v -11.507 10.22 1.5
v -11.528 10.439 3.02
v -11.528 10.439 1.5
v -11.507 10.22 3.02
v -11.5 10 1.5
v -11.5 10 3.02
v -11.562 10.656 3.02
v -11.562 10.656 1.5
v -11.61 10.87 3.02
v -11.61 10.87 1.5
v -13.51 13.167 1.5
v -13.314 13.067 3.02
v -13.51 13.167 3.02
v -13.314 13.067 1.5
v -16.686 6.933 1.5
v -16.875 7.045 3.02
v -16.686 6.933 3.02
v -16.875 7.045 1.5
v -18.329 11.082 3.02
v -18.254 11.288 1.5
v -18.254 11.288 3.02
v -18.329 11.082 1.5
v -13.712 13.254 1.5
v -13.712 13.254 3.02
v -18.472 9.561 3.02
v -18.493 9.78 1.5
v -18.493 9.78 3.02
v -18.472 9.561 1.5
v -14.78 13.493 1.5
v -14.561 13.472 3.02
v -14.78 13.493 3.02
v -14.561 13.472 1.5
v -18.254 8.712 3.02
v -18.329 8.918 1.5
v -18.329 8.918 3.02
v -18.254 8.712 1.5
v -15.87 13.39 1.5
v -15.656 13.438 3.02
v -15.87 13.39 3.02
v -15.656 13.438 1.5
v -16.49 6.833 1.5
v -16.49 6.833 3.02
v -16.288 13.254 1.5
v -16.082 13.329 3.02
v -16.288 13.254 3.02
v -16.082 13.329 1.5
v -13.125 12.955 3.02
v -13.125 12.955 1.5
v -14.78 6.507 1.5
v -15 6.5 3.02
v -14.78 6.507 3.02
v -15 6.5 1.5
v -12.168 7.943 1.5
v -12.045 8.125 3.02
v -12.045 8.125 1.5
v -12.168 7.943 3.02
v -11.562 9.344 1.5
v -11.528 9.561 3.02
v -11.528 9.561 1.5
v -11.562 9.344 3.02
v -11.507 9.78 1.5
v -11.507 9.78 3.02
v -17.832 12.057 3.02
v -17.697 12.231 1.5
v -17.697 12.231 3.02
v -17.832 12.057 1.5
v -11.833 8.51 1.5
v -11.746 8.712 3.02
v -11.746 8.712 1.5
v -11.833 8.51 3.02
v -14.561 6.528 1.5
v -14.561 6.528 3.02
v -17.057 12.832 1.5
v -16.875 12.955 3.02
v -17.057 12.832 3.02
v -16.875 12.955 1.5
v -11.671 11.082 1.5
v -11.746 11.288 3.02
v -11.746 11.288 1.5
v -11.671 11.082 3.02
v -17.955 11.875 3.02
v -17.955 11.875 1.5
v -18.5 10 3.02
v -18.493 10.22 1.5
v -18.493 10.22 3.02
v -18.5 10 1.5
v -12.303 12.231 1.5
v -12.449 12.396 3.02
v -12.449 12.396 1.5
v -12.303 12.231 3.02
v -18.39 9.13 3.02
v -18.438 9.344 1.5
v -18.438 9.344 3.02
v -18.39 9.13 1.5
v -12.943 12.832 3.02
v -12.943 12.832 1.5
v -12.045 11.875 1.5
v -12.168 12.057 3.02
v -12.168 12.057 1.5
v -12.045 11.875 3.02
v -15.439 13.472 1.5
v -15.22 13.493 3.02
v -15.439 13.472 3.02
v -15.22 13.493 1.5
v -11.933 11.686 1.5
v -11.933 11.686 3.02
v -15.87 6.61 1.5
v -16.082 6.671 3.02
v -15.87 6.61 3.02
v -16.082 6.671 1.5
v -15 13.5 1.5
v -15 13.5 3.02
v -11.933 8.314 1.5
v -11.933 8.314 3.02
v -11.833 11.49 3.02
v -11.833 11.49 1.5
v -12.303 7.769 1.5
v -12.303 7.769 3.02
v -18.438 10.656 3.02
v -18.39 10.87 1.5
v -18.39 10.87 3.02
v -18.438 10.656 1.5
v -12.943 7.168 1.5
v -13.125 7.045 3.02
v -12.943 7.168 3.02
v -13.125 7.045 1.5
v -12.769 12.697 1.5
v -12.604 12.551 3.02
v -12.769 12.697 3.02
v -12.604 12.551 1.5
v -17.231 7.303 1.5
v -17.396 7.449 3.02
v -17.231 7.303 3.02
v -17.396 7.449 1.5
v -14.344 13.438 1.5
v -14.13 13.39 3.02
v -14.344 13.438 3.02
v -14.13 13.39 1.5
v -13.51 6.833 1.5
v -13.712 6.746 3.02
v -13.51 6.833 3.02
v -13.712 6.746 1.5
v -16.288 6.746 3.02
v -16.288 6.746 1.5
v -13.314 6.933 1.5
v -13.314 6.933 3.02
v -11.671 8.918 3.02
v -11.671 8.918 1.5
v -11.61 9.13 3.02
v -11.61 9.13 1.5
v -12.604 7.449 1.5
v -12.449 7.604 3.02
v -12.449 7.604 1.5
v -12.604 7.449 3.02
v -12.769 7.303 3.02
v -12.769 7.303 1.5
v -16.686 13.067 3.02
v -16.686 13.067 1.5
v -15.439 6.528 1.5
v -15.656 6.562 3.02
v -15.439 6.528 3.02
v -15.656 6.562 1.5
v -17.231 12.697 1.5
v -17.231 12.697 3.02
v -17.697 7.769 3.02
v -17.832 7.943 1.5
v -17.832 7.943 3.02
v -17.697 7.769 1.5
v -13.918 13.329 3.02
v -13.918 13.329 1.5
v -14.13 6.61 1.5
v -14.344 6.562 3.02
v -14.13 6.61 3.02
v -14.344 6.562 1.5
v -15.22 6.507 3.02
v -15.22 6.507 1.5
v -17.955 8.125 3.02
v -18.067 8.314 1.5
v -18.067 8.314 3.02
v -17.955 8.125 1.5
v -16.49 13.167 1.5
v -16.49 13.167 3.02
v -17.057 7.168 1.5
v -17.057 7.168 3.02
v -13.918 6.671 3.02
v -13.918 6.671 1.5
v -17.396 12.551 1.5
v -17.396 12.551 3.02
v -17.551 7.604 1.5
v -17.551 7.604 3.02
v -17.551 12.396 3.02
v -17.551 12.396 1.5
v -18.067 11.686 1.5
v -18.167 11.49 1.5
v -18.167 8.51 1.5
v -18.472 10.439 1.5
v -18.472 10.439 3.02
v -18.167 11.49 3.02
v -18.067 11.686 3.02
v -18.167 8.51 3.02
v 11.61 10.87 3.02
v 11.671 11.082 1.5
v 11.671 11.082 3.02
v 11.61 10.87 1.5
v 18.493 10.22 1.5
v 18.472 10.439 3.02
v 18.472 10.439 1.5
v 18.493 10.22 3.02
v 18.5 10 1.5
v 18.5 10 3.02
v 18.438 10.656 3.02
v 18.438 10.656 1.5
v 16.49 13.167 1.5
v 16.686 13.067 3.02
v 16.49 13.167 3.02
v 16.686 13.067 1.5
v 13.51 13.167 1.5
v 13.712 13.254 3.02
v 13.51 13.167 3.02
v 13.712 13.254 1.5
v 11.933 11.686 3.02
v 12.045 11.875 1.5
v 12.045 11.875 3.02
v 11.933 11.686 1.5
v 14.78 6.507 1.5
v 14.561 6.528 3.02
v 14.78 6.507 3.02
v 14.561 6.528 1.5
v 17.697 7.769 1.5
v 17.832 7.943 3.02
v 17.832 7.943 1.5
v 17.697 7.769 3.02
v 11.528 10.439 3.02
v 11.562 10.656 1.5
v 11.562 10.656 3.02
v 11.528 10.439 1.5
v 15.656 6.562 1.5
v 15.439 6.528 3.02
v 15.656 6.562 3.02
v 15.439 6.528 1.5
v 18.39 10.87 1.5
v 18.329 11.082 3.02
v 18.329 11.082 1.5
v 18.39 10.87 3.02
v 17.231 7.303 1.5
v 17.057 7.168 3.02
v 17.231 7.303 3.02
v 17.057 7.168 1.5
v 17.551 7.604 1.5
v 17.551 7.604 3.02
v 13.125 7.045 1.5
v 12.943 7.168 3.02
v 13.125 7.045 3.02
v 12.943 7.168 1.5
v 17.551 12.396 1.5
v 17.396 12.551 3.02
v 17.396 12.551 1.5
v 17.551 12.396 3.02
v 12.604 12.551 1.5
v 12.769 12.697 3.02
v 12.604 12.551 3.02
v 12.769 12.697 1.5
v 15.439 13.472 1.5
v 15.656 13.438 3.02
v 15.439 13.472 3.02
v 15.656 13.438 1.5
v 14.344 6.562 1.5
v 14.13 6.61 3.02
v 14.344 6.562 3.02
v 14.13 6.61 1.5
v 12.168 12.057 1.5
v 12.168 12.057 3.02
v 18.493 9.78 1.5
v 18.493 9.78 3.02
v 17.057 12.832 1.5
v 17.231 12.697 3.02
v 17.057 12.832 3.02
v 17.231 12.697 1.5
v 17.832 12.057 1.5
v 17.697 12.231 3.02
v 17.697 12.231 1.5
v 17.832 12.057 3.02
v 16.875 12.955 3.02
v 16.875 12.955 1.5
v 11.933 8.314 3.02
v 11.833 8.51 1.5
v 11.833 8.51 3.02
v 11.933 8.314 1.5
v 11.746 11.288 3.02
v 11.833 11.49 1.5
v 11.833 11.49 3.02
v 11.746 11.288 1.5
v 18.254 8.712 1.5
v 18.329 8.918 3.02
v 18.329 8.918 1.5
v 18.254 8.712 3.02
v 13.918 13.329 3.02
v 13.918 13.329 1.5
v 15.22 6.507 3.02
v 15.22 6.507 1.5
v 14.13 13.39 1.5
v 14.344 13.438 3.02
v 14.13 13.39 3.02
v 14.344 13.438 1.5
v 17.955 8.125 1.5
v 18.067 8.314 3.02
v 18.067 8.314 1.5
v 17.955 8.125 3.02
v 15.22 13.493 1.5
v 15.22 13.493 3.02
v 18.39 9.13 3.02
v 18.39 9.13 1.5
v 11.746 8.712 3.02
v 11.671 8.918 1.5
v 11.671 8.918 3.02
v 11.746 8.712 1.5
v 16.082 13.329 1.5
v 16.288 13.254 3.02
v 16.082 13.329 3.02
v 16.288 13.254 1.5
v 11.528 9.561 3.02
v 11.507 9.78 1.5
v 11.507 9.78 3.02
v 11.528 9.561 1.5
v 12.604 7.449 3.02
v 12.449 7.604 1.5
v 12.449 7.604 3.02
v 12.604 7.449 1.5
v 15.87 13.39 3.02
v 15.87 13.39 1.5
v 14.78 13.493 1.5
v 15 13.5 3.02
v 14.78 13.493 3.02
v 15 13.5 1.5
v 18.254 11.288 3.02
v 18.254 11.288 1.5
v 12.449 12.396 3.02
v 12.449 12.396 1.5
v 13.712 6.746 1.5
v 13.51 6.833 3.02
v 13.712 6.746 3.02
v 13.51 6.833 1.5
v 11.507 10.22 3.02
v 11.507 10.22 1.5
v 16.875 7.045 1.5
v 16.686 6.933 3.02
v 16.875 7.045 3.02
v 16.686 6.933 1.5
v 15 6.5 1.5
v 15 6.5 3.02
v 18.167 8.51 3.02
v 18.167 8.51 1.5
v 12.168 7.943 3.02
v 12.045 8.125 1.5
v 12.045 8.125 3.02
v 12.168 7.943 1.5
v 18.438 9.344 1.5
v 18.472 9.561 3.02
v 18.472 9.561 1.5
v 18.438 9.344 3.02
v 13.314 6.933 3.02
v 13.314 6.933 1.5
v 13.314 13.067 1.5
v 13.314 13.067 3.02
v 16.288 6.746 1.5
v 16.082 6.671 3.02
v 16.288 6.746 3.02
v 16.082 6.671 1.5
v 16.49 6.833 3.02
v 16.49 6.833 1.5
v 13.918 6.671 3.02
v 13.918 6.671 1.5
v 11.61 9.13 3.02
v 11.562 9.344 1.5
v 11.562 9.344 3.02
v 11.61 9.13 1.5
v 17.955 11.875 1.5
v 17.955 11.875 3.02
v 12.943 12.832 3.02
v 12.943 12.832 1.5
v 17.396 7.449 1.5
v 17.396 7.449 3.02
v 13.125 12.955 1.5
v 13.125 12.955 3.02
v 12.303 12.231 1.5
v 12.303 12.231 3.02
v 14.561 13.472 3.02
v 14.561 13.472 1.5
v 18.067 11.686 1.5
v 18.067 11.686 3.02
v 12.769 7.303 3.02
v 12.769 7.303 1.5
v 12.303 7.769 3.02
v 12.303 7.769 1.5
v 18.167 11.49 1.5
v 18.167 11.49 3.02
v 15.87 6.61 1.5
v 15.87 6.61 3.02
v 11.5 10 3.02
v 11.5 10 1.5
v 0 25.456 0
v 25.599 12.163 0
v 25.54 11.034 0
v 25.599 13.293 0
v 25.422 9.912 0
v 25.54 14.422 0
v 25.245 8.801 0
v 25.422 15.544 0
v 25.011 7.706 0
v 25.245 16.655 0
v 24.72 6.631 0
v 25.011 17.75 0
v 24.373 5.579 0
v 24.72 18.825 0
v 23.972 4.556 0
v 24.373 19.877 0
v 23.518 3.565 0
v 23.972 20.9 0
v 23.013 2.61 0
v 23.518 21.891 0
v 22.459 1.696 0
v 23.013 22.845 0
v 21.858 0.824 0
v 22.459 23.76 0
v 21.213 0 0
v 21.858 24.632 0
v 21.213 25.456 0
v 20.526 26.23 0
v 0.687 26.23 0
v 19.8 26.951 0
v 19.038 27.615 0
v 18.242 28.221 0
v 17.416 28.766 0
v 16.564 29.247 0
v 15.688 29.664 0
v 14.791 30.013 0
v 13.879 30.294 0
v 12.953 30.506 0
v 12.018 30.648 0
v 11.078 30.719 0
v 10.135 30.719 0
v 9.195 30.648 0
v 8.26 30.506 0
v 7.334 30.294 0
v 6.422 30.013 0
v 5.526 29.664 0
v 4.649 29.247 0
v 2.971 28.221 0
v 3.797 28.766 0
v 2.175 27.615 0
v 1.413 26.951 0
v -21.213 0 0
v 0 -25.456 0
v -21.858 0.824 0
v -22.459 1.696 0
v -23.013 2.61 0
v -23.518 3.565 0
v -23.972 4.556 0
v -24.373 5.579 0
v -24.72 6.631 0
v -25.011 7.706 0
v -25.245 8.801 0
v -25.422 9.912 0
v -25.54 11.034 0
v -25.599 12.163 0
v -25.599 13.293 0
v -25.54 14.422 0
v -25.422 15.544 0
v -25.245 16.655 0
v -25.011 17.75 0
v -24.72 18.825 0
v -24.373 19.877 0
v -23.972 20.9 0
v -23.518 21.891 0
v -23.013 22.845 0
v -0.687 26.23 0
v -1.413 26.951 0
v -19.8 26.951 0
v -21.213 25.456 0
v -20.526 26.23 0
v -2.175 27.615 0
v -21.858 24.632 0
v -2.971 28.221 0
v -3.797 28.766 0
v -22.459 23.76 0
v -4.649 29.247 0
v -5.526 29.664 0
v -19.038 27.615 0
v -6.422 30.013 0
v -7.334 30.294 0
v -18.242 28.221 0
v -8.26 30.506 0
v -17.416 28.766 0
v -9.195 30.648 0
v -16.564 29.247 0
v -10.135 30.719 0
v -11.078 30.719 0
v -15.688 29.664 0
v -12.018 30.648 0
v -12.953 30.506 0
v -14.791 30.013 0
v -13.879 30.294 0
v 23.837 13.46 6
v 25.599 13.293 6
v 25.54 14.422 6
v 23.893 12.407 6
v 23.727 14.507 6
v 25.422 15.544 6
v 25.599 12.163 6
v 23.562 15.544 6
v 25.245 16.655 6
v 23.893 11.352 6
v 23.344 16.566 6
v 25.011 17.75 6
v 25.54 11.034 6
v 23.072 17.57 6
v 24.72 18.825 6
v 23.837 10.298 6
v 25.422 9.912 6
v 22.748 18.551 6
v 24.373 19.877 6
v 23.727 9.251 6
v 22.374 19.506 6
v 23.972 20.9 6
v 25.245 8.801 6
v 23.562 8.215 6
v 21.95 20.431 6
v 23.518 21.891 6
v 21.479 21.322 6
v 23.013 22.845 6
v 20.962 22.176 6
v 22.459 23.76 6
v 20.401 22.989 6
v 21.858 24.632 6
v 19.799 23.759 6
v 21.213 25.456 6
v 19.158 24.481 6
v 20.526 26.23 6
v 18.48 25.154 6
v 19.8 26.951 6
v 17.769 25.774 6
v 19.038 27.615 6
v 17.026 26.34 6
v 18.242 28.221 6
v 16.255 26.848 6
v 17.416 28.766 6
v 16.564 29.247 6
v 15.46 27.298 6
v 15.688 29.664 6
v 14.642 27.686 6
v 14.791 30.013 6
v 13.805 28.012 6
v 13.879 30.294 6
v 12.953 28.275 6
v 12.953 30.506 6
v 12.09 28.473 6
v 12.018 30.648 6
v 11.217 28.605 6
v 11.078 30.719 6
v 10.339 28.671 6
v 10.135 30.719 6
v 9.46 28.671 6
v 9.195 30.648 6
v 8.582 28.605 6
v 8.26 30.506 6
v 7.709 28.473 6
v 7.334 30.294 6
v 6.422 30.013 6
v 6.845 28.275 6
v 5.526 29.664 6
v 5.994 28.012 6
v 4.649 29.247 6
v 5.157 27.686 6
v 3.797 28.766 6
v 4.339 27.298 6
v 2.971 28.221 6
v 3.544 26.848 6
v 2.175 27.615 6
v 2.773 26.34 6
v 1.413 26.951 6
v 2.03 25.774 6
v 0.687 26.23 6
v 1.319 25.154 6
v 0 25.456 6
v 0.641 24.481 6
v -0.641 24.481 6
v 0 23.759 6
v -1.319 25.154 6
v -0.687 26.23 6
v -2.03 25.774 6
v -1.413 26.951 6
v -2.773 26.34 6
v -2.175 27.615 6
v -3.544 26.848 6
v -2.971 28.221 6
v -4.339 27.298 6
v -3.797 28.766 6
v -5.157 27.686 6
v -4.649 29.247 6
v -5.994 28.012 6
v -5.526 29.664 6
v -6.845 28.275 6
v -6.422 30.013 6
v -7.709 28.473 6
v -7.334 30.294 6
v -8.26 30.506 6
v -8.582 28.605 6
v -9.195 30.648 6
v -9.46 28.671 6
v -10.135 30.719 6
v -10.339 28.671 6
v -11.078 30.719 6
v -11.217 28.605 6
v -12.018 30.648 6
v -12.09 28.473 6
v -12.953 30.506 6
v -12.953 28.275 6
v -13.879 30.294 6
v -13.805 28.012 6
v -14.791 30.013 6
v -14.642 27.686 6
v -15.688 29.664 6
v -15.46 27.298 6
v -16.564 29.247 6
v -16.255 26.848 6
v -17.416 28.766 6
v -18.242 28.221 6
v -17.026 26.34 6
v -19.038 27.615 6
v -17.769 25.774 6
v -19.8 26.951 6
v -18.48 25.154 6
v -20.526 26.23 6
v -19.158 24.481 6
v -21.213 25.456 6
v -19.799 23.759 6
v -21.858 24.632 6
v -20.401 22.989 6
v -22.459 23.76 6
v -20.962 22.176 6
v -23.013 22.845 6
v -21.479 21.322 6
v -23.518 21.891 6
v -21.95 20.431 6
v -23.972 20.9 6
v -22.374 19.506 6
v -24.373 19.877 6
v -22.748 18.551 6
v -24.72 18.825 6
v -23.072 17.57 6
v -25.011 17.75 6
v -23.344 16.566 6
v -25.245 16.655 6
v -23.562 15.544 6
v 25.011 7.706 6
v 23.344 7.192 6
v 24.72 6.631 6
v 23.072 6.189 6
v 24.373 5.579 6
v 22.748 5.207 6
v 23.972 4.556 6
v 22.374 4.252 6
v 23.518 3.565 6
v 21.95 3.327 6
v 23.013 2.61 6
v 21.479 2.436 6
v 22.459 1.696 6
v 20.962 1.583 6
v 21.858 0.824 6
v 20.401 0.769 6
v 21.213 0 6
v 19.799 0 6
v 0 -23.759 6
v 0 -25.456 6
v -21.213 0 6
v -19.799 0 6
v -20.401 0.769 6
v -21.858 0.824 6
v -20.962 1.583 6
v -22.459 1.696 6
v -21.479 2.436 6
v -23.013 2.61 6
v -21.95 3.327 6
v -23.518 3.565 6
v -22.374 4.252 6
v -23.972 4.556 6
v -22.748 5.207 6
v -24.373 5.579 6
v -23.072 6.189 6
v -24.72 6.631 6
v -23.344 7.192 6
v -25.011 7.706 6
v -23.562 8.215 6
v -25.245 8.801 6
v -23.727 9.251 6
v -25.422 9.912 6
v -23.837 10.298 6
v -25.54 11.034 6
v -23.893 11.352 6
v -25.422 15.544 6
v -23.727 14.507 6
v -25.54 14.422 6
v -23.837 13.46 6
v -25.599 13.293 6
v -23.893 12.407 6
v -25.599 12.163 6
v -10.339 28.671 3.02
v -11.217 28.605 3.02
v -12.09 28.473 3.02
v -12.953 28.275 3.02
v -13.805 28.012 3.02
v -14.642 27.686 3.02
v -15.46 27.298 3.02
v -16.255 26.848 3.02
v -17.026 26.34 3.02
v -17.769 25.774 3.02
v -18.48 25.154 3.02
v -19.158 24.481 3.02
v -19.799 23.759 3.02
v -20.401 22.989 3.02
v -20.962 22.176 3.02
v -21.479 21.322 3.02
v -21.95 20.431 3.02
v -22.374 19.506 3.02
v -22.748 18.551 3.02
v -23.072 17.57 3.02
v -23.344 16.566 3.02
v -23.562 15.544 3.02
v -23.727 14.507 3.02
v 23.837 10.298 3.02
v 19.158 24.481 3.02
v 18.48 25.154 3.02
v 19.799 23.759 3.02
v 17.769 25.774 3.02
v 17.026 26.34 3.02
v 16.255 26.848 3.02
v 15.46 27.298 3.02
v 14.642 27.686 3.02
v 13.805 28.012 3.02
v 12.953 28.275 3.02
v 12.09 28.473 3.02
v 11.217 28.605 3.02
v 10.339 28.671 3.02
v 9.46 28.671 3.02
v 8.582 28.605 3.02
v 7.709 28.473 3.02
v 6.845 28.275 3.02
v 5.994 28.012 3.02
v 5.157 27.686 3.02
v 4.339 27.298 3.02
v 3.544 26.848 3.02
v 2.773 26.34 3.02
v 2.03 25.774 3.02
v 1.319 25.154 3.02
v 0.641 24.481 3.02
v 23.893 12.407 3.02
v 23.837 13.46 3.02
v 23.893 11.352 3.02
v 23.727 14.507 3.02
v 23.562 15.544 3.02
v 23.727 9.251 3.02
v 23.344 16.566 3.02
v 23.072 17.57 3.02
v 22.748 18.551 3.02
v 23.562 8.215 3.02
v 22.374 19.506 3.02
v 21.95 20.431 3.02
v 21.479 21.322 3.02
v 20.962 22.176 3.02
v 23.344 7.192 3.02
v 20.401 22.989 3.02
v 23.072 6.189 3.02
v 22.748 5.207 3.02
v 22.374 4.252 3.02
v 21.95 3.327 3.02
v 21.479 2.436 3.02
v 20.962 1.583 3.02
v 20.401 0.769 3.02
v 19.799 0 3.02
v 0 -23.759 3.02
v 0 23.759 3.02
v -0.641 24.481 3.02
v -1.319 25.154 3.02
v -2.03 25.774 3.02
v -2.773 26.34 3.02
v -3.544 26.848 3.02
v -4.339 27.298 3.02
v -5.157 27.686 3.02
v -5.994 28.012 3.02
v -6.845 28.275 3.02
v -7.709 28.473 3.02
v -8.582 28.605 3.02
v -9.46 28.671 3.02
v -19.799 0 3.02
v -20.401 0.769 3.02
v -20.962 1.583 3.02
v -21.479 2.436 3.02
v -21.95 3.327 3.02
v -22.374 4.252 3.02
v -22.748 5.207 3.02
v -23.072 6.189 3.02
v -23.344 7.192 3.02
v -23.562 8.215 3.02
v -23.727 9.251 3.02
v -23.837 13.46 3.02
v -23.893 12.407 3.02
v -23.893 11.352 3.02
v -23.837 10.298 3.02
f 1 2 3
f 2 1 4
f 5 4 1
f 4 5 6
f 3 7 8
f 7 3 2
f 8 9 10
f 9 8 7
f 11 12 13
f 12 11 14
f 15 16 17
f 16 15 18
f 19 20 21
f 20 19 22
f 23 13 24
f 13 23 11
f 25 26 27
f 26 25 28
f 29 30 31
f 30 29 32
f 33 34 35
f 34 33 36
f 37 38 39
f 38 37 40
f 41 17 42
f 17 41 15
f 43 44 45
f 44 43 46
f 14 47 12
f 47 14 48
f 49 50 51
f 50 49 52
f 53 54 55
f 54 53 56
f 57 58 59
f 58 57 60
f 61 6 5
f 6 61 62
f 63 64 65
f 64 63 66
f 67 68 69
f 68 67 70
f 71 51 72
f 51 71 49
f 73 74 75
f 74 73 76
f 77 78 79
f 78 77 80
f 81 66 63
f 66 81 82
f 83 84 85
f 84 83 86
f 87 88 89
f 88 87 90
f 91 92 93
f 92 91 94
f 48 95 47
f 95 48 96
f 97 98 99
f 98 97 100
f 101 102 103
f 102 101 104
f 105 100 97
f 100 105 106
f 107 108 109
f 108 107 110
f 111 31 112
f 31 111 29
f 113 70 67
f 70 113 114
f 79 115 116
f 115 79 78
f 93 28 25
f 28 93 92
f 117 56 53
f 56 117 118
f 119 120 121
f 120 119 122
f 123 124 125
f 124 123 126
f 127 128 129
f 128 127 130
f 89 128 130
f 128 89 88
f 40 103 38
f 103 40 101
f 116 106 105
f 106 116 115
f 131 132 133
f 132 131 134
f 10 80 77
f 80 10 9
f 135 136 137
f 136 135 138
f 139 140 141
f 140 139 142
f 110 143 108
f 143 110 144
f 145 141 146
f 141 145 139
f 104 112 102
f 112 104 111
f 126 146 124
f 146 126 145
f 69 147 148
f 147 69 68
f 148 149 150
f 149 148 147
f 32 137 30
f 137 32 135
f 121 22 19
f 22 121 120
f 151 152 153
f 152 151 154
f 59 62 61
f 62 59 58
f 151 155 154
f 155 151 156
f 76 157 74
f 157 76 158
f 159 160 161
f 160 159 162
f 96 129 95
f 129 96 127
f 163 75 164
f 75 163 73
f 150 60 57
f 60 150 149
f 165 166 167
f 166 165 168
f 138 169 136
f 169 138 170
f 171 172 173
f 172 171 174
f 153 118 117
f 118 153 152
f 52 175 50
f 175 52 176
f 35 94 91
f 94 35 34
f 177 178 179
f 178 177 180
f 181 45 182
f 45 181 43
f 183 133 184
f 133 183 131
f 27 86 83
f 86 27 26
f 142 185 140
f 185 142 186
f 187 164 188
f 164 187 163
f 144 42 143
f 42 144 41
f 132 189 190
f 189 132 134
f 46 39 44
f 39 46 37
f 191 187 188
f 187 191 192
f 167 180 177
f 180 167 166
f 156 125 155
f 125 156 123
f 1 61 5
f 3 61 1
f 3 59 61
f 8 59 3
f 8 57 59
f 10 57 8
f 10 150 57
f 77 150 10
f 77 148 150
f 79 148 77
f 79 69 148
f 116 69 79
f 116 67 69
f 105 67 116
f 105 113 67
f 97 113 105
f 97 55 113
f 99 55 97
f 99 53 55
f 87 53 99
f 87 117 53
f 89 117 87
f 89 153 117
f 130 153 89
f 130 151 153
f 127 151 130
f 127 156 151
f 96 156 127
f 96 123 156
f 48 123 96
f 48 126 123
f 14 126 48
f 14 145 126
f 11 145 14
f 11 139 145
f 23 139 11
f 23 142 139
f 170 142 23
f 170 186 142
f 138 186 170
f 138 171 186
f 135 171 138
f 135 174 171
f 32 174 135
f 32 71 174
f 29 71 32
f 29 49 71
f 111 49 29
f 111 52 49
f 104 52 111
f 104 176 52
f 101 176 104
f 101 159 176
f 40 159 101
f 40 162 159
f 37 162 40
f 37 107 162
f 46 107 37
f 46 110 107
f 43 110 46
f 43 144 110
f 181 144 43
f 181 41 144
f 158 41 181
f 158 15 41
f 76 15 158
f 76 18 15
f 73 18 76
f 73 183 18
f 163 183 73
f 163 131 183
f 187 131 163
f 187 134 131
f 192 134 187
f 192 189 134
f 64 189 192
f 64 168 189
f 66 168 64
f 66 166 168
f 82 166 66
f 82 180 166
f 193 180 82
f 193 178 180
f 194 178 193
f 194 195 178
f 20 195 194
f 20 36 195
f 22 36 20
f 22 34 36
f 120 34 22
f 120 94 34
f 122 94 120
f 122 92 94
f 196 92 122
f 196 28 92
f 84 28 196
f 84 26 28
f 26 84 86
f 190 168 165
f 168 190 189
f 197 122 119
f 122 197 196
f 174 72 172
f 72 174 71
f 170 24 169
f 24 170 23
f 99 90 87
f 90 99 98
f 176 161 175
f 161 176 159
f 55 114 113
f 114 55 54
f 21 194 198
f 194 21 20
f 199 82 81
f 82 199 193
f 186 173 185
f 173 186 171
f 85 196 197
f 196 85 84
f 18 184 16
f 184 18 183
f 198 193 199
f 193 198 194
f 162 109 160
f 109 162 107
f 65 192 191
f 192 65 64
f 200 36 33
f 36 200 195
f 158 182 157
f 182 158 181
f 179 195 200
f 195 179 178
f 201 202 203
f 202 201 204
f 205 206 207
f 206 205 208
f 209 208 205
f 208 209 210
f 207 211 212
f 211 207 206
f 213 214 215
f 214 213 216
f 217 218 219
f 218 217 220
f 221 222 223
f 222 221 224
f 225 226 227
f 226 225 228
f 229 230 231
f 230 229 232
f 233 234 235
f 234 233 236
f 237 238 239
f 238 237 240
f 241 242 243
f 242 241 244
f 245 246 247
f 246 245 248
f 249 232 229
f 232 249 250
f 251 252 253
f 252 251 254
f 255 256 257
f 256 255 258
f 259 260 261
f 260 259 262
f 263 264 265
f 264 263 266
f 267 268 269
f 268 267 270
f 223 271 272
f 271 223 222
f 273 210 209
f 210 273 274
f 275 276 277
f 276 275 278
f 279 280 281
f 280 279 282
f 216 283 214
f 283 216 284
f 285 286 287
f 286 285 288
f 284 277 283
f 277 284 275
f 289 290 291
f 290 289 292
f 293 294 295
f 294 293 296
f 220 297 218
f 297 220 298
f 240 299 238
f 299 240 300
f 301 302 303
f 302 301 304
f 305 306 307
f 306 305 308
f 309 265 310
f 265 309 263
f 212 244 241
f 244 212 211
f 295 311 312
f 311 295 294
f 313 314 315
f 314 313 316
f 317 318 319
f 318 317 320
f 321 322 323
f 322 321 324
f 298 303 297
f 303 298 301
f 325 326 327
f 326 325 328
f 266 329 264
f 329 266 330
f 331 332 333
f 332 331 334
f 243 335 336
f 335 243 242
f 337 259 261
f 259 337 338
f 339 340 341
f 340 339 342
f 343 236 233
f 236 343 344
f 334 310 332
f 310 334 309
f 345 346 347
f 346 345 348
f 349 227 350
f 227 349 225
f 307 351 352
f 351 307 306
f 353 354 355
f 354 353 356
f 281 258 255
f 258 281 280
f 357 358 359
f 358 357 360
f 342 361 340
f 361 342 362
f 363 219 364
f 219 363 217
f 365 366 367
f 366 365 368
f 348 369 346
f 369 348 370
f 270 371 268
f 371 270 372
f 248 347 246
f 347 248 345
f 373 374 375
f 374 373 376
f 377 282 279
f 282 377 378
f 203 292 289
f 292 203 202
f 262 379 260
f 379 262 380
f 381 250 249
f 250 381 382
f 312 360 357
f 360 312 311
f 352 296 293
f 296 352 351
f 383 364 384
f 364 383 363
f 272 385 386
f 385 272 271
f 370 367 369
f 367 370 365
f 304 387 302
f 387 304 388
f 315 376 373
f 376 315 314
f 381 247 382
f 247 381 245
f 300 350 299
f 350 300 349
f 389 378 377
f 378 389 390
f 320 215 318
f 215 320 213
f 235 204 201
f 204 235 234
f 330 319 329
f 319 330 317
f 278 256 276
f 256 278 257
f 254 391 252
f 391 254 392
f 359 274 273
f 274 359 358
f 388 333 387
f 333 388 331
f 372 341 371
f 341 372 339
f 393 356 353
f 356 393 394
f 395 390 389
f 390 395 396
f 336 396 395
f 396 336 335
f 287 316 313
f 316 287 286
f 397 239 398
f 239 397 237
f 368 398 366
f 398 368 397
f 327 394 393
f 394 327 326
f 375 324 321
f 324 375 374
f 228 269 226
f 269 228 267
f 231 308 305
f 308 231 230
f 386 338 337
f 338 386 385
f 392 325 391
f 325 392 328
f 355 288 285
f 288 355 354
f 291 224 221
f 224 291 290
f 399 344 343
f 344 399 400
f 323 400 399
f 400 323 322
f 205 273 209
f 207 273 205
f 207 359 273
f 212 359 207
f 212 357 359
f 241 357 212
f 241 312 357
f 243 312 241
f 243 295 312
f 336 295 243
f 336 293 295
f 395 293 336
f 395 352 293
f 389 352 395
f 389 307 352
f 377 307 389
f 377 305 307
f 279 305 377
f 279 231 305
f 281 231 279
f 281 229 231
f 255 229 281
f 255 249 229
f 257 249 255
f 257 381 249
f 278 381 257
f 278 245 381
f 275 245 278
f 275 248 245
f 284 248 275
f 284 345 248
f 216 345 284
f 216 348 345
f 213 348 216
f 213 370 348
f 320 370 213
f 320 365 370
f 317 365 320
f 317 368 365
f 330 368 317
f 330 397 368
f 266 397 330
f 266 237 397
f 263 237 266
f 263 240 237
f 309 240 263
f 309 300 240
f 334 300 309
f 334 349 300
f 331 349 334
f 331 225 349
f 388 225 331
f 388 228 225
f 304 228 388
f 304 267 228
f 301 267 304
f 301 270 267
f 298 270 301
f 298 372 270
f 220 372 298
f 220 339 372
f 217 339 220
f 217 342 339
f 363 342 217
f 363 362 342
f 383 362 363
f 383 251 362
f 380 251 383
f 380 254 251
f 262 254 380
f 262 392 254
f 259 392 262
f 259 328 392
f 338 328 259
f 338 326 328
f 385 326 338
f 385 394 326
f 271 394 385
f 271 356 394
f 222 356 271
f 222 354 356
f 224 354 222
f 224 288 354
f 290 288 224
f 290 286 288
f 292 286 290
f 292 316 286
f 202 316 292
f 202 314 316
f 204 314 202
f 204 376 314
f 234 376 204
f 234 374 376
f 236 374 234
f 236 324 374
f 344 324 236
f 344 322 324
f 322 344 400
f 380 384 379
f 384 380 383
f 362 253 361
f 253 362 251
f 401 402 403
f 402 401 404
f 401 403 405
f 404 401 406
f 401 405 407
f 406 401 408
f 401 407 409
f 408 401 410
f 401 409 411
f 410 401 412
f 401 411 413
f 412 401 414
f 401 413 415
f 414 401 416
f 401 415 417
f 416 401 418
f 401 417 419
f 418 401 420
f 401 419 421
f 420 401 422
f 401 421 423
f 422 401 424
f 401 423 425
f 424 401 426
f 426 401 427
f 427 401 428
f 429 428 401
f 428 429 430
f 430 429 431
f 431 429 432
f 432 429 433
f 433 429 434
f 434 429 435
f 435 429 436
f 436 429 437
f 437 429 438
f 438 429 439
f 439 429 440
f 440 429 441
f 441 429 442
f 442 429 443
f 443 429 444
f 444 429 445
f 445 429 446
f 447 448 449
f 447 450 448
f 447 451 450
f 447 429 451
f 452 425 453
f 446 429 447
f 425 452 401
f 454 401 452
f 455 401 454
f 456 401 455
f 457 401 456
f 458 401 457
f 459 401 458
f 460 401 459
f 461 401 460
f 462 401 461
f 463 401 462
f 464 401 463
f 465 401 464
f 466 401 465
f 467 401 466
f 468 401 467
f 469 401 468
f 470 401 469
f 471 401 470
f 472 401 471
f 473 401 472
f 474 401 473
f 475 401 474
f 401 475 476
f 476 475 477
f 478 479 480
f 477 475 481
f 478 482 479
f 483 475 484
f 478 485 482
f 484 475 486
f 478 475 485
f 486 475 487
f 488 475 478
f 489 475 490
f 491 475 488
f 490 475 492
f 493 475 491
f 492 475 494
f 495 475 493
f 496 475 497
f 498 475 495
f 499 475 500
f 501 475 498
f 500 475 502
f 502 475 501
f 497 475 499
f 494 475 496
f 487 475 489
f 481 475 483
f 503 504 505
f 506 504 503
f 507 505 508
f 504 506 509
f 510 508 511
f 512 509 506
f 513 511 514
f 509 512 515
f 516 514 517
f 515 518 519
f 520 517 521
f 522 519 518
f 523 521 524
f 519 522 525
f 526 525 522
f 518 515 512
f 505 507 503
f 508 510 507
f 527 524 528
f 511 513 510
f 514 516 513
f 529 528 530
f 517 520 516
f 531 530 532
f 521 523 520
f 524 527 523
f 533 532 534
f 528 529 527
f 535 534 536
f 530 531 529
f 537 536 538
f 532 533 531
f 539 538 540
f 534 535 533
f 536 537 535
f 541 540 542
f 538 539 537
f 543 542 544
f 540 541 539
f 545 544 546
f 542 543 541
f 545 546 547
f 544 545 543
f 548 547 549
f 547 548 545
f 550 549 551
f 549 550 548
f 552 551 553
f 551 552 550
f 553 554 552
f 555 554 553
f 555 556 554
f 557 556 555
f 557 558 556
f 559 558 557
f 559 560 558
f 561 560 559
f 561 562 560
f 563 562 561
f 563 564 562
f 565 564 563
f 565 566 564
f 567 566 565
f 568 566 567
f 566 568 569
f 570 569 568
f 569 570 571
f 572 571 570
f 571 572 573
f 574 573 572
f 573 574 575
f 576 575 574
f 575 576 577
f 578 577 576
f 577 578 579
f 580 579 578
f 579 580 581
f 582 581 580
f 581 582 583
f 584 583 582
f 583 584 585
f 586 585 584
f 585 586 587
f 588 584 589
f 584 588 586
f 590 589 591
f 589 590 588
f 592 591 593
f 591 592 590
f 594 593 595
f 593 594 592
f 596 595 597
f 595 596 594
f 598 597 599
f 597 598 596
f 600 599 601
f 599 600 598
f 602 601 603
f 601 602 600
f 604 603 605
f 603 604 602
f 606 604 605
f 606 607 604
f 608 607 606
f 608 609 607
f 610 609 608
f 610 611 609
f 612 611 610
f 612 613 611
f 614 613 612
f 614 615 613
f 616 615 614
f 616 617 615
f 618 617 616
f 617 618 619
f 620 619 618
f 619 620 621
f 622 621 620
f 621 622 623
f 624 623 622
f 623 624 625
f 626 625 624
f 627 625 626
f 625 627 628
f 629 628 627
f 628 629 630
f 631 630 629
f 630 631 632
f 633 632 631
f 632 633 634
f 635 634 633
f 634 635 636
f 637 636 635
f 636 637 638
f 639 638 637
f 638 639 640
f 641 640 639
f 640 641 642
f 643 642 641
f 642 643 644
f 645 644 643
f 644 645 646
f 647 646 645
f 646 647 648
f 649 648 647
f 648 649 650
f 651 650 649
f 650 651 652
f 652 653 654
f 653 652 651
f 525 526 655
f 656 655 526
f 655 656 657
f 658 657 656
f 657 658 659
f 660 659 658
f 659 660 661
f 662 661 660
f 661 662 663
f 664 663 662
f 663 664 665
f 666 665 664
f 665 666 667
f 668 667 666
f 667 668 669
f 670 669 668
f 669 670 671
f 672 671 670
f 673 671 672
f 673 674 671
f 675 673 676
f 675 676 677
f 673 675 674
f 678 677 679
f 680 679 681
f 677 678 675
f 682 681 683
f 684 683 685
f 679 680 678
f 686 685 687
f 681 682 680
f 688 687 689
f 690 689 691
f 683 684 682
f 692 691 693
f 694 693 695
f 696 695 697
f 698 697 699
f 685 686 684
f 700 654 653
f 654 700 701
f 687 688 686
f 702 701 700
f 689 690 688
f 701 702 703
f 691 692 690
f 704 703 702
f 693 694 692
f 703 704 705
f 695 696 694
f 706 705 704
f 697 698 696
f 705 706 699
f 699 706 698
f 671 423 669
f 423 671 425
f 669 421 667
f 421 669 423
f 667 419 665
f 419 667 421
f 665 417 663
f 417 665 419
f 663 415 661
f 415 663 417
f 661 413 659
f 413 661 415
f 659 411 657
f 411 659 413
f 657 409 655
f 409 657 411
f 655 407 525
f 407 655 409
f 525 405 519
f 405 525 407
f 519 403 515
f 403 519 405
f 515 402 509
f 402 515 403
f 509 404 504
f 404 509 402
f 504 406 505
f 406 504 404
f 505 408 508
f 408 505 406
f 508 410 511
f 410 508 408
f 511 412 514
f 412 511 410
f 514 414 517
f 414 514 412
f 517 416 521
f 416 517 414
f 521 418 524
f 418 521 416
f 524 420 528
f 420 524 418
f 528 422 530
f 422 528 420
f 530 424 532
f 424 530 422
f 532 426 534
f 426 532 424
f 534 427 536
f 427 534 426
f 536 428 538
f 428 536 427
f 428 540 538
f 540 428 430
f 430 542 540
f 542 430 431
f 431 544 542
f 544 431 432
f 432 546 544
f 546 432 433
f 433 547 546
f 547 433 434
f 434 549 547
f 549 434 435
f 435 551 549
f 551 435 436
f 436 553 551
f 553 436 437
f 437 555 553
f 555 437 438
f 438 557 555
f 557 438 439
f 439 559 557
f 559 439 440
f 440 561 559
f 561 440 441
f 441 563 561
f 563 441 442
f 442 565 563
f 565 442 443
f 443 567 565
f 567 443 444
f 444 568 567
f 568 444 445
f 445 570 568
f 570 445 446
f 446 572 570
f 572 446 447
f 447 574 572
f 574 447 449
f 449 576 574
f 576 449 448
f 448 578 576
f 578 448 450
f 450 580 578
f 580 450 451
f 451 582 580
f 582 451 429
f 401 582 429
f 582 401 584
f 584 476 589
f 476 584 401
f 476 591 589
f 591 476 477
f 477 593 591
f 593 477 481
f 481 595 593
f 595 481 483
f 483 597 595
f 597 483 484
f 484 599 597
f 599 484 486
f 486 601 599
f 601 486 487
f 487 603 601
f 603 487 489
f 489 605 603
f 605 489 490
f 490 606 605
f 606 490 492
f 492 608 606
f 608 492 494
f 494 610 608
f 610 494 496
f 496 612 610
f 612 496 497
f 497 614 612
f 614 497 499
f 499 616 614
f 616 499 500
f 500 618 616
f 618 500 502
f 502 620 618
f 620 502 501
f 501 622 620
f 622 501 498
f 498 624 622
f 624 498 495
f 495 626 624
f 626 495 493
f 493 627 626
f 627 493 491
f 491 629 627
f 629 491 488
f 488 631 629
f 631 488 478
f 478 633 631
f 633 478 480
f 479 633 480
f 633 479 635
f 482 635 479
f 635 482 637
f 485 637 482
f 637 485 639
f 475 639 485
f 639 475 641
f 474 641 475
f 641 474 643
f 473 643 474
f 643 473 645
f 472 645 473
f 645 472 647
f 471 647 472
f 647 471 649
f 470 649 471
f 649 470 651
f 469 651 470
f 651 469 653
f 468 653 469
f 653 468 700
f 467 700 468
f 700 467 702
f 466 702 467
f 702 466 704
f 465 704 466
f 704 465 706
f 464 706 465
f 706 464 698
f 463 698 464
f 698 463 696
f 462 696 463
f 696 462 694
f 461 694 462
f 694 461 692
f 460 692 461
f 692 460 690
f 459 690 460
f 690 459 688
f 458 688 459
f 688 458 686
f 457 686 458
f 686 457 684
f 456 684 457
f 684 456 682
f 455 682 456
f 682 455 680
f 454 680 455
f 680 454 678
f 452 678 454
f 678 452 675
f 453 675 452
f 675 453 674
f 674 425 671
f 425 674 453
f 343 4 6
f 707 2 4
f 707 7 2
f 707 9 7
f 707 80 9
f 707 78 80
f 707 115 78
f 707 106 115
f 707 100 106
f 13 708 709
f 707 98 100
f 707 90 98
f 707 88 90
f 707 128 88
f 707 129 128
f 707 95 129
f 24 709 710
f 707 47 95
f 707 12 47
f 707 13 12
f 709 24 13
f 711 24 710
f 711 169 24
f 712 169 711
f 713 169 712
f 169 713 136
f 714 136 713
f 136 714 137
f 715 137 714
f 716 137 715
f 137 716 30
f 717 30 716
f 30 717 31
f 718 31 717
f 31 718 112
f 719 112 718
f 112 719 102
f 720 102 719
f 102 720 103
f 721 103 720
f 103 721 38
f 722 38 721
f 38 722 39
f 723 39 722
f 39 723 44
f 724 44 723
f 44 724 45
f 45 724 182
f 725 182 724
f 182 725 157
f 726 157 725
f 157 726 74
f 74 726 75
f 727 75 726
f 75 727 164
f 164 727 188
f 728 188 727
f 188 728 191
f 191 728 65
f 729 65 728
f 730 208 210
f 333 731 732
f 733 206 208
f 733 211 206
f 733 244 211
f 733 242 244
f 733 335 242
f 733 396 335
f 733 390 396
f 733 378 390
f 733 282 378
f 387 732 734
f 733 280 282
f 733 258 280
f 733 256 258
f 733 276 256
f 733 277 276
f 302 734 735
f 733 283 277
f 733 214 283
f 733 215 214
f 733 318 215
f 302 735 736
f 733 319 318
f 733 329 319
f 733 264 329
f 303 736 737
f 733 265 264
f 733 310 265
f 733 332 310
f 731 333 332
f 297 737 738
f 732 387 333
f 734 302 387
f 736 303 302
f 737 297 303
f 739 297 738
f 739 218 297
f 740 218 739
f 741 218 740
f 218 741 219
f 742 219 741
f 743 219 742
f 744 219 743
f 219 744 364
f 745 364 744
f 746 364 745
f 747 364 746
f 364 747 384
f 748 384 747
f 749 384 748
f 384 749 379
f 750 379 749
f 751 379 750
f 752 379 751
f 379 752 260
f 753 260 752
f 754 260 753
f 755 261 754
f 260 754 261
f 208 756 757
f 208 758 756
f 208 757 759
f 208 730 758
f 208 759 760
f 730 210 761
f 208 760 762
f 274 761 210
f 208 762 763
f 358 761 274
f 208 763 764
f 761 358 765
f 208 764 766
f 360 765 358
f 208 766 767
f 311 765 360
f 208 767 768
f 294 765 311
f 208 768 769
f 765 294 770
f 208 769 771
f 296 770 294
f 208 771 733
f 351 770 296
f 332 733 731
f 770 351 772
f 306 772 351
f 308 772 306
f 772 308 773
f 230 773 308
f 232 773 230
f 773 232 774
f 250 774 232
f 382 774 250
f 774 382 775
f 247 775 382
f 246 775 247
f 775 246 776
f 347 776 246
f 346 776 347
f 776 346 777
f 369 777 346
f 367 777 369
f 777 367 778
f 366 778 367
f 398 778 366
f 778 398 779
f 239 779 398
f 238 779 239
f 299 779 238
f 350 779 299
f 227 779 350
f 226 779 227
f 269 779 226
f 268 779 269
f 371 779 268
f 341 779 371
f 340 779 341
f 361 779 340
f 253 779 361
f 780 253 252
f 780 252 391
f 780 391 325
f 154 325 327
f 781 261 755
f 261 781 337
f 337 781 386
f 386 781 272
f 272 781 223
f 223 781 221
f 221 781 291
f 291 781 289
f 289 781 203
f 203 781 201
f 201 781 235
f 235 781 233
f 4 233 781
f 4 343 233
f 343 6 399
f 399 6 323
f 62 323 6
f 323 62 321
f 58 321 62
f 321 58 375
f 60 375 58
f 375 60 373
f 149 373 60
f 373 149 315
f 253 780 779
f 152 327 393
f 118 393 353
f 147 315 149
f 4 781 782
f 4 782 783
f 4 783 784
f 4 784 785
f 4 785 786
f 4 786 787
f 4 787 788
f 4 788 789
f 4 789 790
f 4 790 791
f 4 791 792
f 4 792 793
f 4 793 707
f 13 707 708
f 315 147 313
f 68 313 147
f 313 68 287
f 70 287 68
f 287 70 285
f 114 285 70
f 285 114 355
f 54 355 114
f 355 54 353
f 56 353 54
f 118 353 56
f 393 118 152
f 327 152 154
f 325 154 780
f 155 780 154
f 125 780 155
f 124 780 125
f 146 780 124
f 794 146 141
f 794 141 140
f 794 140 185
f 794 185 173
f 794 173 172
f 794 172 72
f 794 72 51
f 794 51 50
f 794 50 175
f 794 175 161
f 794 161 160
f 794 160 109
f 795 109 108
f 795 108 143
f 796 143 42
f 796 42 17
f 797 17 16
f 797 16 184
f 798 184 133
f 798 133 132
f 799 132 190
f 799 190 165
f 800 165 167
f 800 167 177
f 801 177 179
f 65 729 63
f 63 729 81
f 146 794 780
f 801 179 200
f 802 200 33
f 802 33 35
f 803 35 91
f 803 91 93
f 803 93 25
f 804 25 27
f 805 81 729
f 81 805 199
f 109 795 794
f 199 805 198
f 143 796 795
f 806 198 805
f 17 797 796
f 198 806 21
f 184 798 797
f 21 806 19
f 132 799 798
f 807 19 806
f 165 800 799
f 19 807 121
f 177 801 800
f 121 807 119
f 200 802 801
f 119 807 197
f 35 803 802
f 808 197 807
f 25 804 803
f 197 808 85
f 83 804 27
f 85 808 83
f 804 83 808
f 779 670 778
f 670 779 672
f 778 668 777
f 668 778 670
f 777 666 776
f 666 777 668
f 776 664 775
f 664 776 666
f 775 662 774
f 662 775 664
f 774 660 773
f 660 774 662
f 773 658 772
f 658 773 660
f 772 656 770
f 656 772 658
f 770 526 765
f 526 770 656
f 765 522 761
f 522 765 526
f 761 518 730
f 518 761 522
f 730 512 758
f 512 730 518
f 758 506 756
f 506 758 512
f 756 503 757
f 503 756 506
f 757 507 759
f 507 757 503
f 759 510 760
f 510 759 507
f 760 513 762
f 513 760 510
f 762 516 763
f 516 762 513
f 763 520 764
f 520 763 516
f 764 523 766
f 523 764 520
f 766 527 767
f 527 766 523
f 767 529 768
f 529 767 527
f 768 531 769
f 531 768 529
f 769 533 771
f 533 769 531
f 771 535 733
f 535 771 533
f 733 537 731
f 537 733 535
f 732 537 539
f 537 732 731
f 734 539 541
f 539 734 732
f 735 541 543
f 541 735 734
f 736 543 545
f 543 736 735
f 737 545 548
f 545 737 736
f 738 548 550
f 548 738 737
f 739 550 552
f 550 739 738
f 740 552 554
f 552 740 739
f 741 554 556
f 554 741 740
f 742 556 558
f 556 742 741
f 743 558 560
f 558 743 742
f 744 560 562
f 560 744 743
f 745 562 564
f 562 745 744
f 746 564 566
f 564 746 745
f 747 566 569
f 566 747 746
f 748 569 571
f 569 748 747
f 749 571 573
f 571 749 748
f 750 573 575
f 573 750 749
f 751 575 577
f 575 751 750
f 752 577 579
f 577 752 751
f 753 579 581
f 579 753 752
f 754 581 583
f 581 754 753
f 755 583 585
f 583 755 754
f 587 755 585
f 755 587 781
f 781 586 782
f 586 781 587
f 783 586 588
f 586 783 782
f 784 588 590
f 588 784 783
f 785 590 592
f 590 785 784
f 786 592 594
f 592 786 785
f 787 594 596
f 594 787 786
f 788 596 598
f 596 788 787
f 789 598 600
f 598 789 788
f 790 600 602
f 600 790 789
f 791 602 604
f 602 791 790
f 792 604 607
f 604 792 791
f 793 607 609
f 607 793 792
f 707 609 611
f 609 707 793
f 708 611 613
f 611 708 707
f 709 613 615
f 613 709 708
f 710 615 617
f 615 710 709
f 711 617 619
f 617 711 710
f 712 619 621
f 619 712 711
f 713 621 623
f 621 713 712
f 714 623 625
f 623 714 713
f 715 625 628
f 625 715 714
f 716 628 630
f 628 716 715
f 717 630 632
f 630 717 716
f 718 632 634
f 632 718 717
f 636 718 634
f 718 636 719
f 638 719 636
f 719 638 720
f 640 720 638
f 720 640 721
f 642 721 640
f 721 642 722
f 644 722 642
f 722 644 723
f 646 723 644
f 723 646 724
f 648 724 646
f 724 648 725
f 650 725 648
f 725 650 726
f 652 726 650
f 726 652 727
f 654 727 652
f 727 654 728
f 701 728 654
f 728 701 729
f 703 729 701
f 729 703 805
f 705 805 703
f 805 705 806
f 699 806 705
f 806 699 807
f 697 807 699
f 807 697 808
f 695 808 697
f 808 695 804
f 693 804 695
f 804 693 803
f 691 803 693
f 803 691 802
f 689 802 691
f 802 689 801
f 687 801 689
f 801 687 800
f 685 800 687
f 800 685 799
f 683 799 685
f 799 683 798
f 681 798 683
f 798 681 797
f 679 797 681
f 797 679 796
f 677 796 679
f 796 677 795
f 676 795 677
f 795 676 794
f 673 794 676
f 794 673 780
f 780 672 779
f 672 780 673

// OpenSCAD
/* [Part] */

// Select the part to render
part = "back"; // [back:Back,face:Face]

/* [Heart Options] */

// Overall size of the heart
heart_size = 30; // [20:1:100]

// How stretched should the heart be
heart_stretch = 1.2; // [1:0.05:1.5]

/* [Text Options] */

// The thickness of the outline around the heart face
outline_thickness = 1; // [1:0.5:3]

// How far does the text and outline stick out from the heart
face_deboss = 1.5; // [0.5:0.5:3]

// The scale of the text relative to the heart
text_scale = 0.3; // [0.1:0.05:0.3]

// The text written on the heart
text = "C & C";

// The font of the text
text_font = "Segoe Script";

/* [Magnets] */

// The diameter of the magnets in mm
magnet_diameter = 7; // [1:0.5:10]

// The thickness of the magnets
magnet_thickness = 1.5; // [0.5:0.5:3]

/* [Advanced] */

// The thickness of the back plate
back_plate_thickness = 1.5; // [1:0.5:3]

// The thickness of the face plate
face_plate_thickness = 1.5; // [1:0.5:3]

// The allowance for the back and face plates to fit together
allowance = 0.2;

/* [Hidden] */

// How many segments rounded objects are rendered with
$fn = 100;

// How far unions and differences should overlap to prevent thin walls
fudge_factor = 0.02;

// Color of the part
heart_color = [0.9, 0.2, 0.2];

build_part();

// Creates the selected part
module build_part() {
  if (part == "assembly") {
    magnet_assembly();
  } else if (part == "back") {
    magnet_back_plate();
  } else if (part == "face") {
    magnet_face_plate();
  } else {
    assert(false, str("The part \"", part, "\" is not a valid selection."));
  }
}

// Creates the back plate
module magnet_back_plate() {
  total_thickness = back_plate_thickness + magnet_thickness + face_plate_thickness + face_deboss;
  face_size = heart_size - outline_thickness * 2;
  
  color(heart_color) {
    difference() {
      // Back
      linear_extrude(height = total_thickness, slices = 1, convexity = 6) {
        heart(size = heart_size, stretch = heart_stretch);
      }
      
      // Walls
      translate([0, 0, back_plate_thickness + magnet_thickness + fudge_factor]) {
        linear_extrude(height = face_plate_thickness + face_deboss) {
          heart(size = face_size, stretch = heart_stretch);
        }
      }
      
      // Magnet Holes
      for(x = [-heart_size/2:heart_size:heart_size/2]) {
        translate([x, heart_size / 3, magnet_thickness * 2]) {
          cylinder(d = magnet_diameter, h = magnet_thickness * 2, center = true);
        }
      }
    }
  }
}

// Creates the face plate
module magnet_face_plate() {
  total_thickness = face_plate_thickness + face_deboss;
  
  color(heart_color) {
    union() {
      linear_extrude(height = face_plate_thickness) {
        heart(size = heart_size - outline_thickness * 2 - allowance, stretch = heart_stretch);
      }

      translate([0, heart_size / 3]) {
        linear_extrude(height = total_thickness, slices = 1) {
          text(text = text, size = heart_size * text_scale, font = text_font, valign = "center", halign = "center");
        }
      }
    }
  }
}

// Creates a heart profile
module heart(size, stretch) {
  scale([1, stretch]) {
    rotate([0, 0, 45]) {
      union() {
        square(size, center = true);
        
        translate([size / 2, 0, 0]) {
          circle(size / 2);
        }
        
        translate([0, size / 2, 0]) {
          circle(size / 2);
        }
      }
    }
  }
}
